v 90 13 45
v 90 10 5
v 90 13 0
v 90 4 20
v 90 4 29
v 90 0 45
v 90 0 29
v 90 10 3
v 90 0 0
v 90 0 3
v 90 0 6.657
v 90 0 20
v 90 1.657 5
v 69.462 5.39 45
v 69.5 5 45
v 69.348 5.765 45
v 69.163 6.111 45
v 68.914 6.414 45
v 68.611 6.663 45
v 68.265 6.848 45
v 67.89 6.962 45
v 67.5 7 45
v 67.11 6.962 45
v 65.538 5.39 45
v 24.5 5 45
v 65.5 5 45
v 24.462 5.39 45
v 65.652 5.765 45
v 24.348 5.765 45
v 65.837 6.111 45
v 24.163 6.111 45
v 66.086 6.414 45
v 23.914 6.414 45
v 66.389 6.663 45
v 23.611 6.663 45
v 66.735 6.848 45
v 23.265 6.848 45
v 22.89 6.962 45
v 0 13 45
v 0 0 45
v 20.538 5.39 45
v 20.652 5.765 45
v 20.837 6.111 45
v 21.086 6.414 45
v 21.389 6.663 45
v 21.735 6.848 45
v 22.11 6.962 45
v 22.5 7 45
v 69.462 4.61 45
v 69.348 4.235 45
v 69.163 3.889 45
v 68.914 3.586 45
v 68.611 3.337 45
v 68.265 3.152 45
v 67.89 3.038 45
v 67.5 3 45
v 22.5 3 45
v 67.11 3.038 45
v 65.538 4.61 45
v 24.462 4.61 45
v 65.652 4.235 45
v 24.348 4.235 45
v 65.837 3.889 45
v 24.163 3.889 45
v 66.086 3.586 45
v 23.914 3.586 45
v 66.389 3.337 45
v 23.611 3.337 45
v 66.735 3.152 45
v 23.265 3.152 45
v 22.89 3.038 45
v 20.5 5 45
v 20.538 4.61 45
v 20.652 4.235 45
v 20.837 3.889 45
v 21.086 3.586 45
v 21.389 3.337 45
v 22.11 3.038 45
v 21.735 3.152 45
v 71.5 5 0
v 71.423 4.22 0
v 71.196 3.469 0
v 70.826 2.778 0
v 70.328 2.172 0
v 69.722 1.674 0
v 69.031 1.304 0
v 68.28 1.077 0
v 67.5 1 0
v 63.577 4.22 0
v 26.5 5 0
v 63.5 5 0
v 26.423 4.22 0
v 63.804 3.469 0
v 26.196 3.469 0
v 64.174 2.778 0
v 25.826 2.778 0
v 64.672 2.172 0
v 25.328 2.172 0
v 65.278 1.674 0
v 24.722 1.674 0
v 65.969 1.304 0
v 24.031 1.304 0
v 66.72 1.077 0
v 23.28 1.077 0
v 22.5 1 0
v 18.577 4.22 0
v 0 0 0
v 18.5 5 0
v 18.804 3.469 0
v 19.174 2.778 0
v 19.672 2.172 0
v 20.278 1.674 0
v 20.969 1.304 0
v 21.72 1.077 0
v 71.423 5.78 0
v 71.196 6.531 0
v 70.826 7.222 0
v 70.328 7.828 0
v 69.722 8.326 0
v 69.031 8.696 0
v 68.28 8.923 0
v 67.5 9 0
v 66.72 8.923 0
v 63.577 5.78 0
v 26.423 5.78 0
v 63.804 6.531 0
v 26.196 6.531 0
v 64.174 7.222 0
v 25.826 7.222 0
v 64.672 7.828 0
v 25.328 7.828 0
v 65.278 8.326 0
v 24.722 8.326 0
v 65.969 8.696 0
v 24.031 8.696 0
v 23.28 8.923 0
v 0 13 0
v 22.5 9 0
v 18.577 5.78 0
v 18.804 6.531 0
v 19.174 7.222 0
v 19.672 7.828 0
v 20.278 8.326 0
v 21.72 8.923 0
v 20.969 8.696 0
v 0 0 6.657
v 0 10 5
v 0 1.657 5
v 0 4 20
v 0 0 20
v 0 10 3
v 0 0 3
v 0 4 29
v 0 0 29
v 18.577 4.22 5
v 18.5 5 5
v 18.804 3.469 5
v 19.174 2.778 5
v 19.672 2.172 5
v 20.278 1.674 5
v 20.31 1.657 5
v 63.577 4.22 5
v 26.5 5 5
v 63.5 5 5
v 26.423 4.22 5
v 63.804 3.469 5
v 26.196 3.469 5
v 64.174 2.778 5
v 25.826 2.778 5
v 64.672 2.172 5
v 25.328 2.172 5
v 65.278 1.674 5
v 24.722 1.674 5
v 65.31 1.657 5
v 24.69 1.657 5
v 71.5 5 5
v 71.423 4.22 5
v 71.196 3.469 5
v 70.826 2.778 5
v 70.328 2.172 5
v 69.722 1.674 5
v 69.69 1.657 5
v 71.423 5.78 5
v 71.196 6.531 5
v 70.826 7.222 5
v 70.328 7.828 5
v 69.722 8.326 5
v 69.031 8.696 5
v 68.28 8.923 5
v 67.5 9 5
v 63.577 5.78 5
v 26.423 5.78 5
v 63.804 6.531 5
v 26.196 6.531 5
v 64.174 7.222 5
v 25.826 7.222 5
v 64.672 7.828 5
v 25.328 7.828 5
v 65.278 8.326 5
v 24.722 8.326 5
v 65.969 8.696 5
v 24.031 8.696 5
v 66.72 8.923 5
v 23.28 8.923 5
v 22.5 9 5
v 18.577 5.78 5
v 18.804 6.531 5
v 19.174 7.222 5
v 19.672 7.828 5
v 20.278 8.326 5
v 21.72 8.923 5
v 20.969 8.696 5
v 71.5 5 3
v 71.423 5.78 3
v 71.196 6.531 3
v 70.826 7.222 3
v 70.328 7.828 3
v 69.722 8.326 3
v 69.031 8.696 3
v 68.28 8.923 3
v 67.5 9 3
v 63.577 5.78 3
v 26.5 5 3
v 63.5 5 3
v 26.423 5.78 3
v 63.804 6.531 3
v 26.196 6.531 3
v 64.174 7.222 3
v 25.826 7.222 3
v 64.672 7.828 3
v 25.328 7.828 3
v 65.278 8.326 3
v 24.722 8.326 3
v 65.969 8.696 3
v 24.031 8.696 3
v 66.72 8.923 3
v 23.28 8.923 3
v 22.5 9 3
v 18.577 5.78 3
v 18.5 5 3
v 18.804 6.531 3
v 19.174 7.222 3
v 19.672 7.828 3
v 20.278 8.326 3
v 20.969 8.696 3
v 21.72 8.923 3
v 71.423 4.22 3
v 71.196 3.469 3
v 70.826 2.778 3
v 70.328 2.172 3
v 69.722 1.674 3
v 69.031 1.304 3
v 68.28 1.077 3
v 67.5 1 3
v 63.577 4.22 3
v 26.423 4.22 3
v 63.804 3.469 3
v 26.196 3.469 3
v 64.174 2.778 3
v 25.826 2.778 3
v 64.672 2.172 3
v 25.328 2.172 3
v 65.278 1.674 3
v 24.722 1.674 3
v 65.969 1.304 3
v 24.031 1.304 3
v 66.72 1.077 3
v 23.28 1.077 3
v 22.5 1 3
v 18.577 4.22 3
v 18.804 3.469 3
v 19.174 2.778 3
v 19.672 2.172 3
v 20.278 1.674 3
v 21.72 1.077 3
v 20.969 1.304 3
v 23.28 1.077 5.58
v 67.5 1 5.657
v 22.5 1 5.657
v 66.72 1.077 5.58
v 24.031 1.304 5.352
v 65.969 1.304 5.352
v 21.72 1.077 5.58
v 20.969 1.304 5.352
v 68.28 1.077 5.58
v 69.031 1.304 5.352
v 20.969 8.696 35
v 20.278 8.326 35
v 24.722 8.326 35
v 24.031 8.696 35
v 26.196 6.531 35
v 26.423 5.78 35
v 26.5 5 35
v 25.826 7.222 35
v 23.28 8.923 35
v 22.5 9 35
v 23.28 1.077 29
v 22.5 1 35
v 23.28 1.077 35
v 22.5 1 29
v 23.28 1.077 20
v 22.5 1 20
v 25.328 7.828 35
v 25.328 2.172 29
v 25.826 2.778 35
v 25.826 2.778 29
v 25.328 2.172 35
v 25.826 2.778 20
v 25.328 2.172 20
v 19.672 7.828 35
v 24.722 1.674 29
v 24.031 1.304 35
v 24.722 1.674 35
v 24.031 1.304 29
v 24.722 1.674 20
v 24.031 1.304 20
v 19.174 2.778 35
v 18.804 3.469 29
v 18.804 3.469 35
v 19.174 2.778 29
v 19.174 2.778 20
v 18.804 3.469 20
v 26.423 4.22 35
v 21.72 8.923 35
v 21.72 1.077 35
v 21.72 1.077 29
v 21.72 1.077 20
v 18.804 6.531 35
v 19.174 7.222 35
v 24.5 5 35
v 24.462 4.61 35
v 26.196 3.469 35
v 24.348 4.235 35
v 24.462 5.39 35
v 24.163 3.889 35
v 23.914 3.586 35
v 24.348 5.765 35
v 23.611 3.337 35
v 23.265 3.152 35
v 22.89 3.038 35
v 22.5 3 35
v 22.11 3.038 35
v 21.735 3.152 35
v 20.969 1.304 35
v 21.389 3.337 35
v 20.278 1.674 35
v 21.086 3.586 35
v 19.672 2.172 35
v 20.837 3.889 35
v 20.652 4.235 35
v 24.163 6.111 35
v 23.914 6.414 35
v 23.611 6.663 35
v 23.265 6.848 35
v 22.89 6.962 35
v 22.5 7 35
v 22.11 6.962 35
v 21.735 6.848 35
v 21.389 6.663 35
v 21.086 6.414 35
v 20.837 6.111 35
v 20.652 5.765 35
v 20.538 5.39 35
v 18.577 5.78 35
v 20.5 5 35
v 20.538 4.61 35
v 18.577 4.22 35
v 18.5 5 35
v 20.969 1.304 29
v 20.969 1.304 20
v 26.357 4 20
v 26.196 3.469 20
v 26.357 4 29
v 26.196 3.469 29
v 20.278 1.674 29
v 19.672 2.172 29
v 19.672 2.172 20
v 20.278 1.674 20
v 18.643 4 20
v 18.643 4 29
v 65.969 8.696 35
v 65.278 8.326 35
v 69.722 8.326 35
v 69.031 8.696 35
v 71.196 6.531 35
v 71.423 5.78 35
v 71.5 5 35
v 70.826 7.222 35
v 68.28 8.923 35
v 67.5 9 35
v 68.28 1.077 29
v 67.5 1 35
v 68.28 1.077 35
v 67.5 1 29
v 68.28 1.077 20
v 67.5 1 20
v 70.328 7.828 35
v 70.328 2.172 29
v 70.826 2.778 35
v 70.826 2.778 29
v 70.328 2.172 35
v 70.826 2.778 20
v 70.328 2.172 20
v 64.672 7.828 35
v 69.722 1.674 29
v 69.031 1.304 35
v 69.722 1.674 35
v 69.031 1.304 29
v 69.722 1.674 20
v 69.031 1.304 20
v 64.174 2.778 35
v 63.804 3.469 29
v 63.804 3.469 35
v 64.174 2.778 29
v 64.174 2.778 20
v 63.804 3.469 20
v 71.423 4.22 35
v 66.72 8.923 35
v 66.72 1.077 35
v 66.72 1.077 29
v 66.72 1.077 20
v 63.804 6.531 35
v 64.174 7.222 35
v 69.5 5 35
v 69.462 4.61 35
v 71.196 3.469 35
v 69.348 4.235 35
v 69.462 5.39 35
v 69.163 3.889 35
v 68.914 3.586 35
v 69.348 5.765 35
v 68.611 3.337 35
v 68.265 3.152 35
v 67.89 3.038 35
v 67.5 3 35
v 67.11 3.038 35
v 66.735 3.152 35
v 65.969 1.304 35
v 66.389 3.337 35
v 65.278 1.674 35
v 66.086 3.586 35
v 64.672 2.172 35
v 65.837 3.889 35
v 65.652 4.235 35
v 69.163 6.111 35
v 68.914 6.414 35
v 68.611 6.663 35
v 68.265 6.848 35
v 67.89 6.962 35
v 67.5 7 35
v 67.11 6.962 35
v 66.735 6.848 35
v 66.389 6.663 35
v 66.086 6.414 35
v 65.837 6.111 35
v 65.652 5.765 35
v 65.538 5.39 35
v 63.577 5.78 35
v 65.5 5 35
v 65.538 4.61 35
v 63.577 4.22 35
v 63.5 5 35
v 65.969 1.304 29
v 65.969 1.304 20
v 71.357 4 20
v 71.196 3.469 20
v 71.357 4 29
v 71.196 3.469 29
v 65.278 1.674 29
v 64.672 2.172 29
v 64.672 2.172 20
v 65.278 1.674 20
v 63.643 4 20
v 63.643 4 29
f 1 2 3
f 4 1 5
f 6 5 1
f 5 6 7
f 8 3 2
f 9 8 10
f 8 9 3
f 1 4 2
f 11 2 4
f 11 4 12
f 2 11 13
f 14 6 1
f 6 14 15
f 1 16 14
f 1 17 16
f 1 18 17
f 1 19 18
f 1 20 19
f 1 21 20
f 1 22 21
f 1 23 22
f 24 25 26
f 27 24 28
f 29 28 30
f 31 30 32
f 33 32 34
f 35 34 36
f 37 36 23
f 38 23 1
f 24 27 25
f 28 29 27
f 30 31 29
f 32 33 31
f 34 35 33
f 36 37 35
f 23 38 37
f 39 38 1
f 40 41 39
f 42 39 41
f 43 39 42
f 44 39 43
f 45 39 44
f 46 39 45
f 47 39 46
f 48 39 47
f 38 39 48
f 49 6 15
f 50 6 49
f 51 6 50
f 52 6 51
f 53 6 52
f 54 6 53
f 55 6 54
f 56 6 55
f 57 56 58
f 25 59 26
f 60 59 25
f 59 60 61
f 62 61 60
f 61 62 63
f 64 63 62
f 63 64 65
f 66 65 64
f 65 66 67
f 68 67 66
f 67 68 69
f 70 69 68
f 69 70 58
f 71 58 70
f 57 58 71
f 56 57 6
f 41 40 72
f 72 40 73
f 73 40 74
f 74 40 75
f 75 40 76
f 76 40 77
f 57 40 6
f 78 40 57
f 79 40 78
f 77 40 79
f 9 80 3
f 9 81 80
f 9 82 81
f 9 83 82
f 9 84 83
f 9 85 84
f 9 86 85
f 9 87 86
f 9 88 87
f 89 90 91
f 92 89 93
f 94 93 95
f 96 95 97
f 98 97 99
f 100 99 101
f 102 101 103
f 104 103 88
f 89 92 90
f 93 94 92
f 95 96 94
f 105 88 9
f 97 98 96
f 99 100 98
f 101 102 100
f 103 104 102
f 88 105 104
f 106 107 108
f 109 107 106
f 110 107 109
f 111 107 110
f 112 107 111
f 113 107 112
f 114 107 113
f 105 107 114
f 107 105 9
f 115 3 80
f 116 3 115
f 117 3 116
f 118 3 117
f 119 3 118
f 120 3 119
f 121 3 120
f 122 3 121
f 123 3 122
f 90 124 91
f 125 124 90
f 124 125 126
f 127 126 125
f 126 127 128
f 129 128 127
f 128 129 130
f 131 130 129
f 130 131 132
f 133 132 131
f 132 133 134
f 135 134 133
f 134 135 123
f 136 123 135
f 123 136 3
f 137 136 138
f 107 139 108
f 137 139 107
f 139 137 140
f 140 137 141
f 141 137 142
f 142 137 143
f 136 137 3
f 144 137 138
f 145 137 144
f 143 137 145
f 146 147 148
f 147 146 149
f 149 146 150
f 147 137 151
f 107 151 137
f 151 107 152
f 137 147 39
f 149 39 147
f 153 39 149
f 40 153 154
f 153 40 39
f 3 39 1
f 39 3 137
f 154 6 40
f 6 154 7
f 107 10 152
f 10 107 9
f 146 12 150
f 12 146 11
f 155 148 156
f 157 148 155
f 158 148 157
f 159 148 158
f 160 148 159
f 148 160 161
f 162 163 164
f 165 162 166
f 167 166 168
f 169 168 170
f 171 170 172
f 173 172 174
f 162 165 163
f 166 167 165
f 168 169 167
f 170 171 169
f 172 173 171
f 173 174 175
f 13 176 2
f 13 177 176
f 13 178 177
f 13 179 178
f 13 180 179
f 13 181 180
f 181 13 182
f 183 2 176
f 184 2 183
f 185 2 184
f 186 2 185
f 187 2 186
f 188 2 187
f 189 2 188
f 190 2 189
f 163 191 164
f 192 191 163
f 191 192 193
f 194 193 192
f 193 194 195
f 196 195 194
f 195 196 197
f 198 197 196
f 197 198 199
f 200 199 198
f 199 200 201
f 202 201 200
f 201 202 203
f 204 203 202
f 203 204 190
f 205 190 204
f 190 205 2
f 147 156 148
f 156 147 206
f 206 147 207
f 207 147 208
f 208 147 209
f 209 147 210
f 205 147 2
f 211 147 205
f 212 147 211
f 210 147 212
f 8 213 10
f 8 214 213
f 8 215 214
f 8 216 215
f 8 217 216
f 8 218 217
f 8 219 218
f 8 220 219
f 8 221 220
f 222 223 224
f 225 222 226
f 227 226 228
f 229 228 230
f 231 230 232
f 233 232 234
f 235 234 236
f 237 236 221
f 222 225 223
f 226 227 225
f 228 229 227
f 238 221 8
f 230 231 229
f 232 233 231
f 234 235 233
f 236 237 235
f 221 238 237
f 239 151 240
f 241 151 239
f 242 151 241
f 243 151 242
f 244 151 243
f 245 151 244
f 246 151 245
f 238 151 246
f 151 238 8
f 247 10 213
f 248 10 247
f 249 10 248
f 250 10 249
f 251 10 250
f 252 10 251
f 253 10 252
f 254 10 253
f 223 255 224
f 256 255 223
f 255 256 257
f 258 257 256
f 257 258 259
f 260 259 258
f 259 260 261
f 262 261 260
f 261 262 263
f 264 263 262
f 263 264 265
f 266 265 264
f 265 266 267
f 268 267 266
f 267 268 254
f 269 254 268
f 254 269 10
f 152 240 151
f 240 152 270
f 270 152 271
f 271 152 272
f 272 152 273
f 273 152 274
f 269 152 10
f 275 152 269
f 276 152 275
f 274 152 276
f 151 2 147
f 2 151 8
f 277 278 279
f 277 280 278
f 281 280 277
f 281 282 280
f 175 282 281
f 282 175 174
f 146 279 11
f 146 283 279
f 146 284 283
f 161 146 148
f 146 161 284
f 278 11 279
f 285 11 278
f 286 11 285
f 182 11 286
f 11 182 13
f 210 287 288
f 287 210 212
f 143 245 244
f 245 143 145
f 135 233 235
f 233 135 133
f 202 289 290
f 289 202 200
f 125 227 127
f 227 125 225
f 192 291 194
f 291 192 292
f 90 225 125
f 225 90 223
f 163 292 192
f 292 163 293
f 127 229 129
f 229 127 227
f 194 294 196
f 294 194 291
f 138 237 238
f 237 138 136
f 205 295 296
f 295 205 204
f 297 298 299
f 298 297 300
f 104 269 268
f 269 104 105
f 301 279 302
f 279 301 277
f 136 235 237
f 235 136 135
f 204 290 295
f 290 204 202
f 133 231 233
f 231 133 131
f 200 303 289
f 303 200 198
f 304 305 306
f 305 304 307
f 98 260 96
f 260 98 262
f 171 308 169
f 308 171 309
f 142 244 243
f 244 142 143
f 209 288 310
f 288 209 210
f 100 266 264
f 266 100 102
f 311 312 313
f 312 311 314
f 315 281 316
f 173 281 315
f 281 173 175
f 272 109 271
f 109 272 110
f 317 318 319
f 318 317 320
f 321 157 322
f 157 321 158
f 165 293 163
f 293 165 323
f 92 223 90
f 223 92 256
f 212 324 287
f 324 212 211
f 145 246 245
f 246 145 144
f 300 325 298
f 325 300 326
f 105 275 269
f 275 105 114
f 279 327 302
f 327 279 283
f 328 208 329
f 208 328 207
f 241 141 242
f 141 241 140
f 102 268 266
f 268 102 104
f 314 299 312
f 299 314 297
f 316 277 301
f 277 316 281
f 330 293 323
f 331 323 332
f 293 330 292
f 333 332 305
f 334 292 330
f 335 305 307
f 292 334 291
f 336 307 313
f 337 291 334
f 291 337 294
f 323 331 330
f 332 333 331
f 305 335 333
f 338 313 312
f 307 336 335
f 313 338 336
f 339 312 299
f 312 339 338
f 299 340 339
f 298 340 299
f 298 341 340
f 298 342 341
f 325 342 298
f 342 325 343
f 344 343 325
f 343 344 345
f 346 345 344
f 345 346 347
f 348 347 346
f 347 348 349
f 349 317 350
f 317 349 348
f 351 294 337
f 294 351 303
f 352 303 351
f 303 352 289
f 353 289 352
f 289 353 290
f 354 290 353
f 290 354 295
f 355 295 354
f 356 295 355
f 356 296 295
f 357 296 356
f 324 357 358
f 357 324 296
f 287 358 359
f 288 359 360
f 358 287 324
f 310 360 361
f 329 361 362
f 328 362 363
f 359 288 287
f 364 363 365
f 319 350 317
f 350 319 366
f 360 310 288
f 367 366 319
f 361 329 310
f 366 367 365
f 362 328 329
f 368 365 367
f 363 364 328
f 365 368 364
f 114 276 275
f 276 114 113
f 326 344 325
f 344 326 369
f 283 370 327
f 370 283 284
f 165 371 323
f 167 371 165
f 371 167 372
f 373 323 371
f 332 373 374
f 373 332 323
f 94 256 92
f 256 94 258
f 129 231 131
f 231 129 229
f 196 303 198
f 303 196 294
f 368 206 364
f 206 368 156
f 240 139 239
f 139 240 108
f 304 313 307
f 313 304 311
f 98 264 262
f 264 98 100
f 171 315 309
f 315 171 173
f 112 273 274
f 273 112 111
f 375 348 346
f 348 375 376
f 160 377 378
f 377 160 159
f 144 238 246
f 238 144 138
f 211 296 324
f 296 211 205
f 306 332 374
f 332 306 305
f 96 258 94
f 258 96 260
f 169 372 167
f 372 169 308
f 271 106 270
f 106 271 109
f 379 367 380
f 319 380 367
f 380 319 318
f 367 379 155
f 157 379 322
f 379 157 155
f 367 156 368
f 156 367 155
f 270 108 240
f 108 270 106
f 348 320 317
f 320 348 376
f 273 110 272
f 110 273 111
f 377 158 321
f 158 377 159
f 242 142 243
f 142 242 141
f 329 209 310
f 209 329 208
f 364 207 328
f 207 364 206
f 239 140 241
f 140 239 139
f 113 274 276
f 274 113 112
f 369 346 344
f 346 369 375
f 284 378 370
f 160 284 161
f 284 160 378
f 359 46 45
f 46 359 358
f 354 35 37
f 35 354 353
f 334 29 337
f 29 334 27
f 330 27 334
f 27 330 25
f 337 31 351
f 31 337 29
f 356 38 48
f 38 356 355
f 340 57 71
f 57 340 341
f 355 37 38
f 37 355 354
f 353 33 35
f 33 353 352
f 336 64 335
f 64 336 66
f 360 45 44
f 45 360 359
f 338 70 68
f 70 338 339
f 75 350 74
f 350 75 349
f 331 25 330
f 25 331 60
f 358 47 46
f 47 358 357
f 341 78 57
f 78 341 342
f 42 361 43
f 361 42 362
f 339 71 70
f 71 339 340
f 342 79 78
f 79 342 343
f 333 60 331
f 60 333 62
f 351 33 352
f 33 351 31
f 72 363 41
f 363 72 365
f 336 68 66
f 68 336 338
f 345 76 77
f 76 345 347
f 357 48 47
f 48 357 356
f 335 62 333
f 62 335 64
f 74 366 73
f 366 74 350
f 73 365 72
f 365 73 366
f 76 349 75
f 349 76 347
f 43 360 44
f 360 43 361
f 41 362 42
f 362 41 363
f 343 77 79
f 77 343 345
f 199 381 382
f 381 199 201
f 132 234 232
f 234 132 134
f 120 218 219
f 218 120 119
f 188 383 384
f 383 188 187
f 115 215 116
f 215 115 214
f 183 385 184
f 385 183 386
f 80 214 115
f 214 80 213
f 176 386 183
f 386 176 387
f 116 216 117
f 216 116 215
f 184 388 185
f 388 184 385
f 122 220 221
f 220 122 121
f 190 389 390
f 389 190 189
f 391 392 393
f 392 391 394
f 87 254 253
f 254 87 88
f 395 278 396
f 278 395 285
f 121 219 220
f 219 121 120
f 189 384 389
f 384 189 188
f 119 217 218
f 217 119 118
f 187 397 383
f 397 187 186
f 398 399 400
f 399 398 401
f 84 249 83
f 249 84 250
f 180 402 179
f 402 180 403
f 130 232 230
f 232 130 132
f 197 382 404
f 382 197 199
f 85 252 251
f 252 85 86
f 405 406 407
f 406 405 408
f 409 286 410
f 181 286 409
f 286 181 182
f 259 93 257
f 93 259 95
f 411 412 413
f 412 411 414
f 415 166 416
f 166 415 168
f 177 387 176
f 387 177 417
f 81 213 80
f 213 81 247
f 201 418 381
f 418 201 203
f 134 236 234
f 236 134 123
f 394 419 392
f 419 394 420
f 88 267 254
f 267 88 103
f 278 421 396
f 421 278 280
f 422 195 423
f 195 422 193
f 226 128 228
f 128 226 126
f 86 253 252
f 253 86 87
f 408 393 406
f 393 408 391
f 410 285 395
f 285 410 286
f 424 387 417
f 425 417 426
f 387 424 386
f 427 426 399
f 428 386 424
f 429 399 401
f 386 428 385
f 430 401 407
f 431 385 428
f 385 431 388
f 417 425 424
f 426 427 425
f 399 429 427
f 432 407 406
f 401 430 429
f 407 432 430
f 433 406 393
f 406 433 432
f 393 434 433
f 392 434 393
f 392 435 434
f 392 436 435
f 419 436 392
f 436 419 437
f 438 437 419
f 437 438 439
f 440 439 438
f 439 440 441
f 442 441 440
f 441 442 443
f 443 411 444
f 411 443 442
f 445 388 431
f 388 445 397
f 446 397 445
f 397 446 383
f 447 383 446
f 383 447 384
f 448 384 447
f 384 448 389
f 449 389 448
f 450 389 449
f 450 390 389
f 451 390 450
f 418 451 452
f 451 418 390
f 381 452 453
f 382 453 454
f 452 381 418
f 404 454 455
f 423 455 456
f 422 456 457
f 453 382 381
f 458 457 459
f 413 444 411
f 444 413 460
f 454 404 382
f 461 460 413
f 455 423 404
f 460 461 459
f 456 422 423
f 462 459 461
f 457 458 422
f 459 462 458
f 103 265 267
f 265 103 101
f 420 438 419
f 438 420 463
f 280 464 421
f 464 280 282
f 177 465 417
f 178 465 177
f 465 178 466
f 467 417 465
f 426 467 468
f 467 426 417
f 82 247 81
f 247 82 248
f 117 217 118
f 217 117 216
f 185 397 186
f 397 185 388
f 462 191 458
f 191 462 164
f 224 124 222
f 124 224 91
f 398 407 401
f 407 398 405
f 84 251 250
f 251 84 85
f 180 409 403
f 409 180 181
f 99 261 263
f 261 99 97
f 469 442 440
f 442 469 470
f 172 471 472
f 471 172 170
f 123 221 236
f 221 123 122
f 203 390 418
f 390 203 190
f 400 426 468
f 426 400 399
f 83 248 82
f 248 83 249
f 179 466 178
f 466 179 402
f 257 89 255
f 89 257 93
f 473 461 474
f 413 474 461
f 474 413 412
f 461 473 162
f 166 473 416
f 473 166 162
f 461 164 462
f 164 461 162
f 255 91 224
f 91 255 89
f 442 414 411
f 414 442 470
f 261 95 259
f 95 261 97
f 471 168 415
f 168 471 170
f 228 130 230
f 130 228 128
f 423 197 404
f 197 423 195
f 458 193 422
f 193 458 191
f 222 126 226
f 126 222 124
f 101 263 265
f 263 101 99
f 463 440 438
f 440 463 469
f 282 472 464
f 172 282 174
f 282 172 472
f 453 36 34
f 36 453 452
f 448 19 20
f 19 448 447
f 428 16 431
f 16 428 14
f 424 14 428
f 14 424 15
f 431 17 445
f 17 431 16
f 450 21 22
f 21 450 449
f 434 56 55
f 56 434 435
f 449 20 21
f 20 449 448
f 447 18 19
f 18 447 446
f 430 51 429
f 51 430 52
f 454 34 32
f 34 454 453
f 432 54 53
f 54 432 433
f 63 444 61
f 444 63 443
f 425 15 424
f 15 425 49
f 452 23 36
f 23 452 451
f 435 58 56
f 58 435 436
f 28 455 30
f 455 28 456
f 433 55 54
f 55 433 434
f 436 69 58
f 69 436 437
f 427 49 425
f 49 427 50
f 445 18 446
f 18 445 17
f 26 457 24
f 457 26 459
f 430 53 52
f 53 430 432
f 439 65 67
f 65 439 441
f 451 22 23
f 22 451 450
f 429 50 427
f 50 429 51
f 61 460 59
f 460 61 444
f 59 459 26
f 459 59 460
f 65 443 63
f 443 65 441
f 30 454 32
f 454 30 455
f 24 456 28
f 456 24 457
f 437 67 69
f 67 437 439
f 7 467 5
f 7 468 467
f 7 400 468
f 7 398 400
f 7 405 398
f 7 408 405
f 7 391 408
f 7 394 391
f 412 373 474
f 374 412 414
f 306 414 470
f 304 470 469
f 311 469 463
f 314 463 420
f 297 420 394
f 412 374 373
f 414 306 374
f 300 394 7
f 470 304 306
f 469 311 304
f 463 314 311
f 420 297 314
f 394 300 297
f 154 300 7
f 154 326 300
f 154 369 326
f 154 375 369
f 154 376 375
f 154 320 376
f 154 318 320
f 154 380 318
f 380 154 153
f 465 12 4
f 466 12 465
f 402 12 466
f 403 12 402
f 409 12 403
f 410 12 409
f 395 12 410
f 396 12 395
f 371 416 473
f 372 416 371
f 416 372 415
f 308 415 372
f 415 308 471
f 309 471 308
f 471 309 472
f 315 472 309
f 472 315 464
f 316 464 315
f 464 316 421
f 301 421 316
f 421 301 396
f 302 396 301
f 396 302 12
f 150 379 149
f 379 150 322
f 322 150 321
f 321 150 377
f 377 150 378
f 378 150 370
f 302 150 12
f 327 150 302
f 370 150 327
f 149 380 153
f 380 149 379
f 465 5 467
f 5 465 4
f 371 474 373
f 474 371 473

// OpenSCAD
//Height of the spacer, default is flush with the mounting surface
spacer_height = 45; // [45:90]

//Radius of hole to fix screw length
screw_head_radius = 4; // [2:4.5]

//Radius of screw thread
screw_radius = 2; // [1:4.5]

//Length of thread to be inside spacer
screw_length = 10; // [3:45]
head_hole_height = spacer_height - screw_length;

difference() {
	difference() {
		difference() {
			difference() {
				difference() {
					cube(size = [90, 13, spacer_height]);
					translate(v = [0, 0, 3]) {
						cube(size = [90, 10, 2]);
					}
				}
				translate(v = [0, -1, 0]) {
					translate(v = [0, 0, 2]) {
						rotate(a = spacer_height, v = [1, 0, 0]) {
							cube(size = [90, 4, 4]);
						}
					}
				}
			}
			translate(v = [22.5000000000, 0, 0]) {
				translate(v = [0, 5, 0]) {
					union() {
						cylinder($fn = 32, h = head_hole_height, r = screw_head_radius);
						translate(v = [0, 0, head_hole_height]) {
							cylinder($fn = 32, h = screw_length, r = screw_radius);
						}
					}
				}
			}
		}
		translate(v = [67.5000000000, 0, 0]) {
			translate(v = [0, 5, 0]) {
				union() {
					cylinder($fn = 32, h = head_hole_height, r = screw_head_radius);
					translate(v = [0, 0, head_hole_height]) {
						cylinder($fn = 32, h = screw_length, r = screw_radius);
					}
				}
			}
		}
	}
	translate(v = [0, 0, 20]) {
		cube(size = [90, 4, 9]);
	}
}
/***********************************************
*********      SolidPython code:      **********
************************************************
 
''' Mounting spacers for lvpin LP-2020a+ stereo

Spacers which allow an lvpin LP-2020a+ stereo to be mounted under a bench,
table or cabinet. There is a slot to allow for wires to pass through to the
front (I am using them for the power and audio of my music source).

Customised parameters allow different sized screws to be used for mounting.

This work is licensed under a Creative Commons Attribution-ShareAlike 4.0
International License.
http://creativecommons.org/licenses/by-sa/4.0/
'''
import solid as s
import solid.utils as u

spacer_width = 13
spacer_depth = 90
screw_offset = 22.5
screw_offset_2 = spacer_depth - screw_offset

v = s.variables(
    s.var('spacer_height', 45,
          comment='Height of the spacer, default is flush with the '
                  'mounting surface',
          end_comment='[45:90]'),
    s.var('screw_head_radius', 4,
          comment='Radius of hole to fix screw length',
          end_comment='[2:4.5]'),
    s.var('screw_radius', 2,
          comment='Radius of screw thread',
          end_comment='[1:4.5]'),
    s.var('screw_length', 10,
          comment='Length of thread to be inside spacer',
          end_comment='[3:45]'),
    s.var('head_hole_height', 'spacer_height - screw_length'),
)

body = s.cube(size=[spacer_depth, spacer_width, v.spacer_height])

slot = u.up(3)(s.cube(size=[spacer_depth, 10, 2]))
slot_round = u.back(1)(u.up(2)(
    s.rotate(a=v.spacer_height, v=[1, 0, 0])(
        s.cube(size=[spacer_depth, 4, 4])
    )
))


def screw_hole():
    return u.forward(5)(
        s.cylinder(r=v.screw_head_radius, h=v.head_hole_height, segments=32) +
        u.up(v.head_hole_height)(
            s.cylinder(r=v.screw_radius, h=v.screw_length, segments=32)
        )
    )

screw_hole_1 = u.right(screw_offset)(screw_hole())
screw_hole_2 = u.right(screw_offset_2)(screw_hole())

wire_run = u.up(20)(s.cube(size=[spacer_depth, 4, 9]))

final = body - slot - slot_round - screw_hole_1 - screw_hole_2 - wire_run

s.scad_render_to_file(final, __file__.replace('.py', '.scad'), variables=v)
 
 
************************************************/
